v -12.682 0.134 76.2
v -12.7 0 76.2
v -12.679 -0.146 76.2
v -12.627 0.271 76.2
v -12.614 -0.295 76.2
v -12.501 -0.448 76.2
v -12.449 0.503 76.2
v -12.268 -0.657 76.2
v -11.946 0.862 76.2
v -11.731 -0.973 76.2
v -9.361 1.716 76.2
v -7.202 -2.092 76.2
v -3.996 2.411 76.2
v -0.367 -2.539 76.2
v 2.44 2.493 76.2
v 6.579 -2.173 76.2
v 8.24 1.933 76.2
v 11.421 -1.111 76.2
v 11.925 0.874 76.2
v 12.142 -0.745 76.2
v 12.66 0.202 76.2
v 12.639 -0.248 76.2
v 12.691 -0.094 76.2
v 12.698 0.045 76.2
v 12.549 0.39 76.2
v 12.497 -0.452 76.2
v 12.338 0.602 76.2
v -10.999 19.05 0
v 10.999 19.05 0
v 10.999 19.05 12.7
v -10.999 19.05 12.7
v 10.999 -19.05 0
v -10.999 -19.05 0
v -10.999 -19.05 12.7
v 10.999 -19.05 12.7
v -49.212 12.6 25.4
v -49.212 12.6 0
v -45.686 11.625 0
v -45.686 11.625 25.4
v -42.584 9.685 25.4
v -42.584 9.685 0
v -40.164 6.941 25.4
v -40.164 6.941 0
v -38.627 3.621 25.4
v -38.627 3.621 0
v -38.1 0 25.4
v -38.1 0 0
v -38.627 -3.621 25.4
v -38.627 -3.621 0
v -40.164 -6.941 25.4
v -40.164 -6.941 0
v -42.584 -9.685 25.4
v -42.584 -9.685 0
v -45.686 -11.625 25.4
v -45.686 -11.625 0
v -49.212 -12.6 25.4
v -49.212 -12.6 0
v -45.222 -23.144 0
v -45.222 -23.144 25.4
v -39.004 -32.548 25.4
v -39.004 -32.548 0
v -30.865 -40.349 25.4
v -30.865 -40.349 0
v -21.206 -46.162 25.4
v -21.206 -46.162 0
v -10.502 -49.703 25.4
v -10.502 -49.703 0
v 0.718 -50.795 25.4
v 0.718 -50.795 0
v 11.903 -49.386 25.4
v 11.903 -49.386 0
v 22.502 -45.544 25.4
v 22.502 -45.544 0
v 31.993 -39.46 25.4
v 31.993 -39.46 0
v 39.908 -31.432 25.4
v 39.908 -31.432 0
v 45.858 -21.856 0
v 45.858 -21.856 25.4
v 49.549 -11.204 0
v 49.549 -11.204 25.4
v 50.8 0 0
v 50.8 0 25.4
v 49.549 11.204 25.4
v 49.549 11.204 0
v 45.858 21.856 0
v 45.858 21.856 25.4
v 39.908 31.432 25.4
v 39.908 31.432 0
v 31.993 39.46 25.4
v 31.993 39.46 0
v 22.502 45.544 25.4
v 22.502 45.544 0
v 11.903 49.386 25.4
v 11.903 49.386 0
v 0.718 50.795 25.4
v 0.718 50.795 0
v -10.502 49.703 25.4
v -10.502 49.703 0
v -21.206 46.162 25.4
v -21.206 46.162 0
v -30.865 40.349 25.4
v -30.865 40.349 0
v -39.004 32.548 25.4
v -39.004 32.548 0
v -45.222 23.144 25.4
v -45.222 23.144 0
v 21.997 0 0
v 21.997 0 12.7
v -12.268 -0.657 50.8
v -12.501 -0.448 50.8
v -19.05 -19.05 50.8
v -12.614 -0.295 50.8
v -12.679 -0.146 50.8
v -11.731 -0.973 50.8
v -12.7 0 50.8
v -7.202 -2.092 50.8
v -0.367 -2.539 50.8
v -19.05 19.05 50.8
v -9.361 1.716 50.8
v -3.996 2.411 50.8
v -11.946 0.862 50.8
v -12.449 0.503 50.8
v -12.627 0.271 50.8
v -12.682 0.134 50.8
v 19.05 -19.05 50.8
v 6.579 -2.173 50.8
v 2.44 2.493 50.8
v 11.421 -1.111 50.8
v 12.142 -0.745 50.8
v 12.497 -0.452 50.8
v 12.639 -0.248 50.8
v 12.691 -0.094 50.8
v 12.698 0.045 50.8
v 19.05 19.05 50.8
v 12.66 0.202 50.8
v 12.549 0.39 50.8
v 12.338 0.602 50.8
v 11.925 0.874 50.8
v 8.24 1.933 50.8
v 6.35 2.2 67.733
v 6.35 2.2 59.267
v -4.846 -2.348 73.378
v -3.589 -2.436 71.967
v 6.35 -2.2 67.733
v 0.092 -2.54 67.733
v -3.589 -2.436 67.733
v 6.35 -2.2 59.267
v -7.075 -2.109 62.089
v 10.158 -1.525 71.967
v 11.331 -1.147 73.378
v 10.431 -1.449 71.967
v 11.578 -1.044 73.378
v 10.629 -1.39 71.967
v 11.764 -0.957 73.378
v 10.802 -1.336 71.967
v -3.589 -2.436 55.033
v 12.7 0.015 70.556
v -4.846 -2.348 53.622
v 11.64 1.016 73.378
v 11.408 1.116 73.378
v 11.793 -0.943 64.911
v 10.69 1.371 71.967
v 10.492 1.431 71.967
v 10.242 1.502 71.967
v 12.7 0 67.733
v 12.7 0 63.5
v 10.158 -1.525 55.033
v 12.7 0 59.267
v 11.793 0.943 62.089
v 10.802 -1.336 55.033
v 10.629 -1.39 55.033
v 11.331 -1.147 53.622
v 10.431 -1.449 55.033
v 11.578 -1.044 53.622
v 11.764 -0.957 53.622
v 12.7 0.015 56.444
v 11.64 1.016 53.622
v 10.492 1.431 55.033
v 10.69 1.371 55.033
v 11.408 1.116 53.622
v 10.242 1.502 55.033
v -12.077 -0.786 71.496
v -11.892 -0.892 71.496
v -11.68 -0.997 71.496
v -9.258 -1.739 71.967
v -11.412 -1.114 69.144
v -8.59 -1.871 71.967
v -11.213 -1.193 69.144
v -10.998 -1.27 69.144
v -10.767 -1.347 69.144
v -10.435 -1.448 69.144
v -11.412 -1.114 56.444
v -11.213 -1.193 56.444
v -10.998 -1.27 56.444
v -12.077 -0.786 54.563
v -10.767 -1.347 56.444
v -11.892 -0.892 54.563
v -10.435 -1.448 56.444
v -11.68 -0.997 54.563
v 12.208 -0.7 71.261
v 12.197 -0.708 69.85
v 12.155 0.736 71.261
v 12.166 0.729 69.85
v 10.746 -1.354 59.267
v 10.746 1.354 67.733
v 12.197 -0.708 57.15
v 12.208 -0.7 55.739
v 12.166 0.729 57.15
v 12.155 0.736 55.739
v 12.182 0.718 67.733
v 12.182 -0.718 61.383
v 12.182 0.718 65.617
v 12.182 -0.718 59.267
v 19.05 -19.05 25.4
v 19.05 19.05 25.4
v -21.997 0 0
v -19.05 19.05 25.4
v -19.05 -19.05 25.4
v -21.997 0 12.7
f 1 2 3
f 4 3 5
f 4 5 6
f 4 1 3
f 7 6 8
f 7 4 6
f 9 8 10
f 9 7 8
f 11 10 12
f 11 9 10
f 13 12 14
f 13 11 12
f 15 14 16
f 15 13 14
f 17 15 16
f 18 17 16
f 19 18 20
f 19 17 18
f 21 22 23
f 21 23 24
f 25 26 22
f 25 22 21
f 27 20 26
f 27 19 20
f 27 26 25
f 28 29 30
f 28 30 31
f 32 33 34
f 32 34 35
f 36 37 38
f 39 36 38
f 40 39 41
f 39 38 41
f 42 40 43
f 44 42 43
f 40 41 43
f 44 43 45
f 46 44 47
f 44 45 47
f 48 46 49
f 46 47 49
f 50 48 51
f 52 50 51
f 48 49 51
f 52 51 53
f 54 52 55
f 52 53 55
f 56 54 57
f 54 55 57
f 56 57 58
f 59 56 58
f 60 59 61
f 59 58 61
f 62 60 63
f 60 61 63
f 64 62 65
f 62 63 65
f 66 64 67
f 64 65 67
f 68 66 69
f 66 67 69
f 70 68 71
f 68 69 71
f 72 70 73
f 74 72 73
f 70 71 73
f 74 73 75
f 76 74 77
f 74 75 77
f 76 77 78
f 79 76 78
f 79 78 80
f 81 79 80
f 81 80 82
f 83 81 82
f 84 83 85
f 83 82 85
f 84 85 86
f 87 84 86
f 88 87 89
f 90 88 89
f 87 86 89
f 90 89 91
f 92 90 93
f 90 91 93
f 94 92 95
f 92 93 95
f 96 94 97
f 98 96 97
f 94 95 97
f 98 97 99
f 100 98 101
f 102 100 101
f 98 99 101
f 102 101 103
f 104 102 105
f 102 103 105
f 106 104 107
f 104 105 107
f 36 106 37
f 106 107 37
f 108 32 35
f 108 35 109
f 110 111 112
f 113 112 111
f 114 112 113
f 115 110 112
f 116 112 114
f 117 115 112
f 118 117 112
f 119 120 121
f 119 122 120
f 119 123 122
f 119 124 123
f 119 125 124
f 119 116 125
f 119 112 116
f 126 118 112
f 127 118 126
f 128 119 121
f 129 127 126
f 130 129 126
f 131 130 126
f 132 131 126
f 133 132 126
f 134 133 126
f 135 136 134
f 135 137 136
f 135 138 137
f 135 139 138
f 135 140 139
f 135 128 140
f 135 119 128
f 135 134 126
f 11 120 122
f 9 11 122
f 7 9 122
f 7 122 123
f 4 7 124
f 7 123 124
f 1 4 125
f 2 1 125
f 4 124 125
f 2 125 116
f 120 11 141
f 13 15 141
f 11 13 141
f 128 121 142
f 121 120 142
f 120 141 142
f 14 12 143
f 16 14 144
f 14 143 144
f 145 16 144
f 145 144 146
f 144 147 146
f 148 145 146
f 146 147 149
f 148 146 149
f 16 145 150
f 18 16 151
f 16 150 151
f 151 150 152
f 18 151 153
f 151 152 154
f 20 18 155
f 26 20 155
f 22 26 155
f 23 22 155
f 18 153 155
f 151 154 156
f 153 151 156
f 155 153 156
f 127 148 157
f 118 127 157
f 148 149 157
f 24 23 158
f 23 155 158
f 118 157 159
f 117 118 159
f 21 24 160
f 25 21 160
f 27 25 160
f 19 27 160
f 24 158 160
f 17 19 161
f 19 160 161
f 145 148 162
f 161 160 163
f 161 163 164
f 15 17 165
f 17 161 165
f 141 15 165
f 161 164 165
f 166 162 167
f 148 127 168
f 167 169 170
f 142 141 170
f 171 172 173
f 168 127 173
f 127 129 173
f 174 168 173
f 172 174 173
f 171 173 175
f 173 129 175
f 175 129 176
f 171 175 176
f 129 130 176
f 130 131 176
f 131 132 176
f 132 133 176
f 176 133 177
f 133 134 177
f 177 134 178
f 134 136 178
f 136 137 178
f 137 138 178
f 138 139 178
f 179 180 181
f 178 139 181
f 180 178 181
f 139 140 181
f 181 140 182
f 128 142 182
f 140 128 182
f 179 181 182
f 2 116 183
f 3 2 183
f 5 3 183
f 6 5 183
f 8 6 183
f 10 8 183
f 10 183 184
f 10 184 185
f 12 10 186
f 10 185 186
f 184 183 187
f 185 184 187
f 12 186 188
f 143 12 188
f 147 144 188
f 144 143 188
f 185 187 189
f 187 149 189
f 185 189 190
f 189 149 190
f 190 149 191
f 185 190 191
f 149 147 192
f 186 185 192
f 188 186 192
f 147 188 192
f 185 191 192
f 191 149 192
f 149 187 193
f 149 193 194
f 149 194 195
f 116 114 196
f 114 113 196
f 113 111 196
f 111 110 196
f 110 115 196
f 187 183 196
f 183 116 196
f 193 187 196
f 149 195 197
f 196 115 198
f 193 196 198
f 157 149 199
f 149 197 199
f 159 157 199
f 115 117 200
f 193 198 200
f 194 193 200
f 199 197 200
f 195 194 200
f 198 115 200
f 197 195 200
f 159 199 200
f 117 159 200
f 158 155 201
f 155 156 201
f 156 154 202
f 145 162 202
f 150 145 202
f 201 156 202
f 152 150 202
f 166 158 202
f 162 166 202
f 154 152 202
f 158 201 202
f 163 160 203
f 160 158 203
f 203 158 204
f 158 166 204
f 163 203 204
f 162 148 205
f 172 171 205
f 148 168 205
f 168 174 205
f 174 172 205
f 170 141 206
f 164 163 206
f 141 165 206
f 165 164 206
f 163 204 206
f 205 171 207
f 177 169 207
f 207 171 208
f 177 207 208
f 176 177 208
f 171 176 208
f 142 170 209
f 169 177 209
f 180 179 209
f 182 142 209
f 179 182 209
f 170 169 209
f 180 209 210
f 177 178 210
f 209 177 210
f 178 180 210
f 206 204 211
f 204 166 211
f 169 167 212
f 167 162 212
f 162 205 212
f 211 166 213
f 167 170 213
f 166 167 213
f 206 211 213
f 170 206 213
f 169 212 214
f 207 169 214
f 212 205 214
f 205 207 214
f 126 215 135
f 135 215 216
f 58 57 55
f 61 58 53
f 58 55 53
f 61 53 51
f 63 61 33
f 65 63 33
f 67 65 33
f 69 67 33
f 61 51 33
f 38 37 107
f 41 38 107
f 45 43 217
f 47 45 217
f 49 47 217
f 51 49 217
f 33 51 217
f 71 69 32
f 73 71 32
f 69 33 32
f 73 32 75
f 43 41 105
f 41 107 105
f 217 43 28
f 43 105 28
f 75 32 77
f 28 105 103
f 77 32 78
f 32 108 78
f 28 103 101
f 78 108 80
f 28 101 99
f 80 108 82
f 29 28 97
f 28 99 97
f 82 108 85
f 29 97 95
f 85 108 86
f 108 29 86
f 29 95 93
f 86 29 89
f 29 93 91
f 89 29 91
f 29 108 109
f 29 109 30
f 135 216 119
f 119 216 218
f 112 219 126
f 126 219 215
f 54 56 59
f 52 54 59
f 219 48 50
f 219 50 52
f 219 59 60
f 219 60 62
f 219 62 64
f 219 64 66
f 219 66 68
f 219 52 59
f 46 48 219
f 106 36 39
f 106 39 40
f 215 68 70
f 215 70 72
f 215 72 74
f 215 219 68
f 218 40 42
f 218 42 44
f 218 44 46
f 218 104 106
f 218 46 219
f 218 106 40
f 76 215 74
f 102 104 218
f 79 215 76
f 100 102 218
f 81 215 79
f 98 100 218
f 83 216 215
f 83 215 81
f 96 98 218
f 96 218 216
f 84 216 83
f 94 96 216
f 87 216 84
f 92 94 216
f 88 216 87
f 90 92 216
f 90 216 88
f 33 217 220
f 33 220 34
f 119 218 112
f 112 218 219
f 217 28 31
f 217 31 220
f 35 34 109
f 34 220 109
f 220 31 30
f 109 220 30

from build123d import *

# Parameters (mm, degrees)
F1_DEPTH = 25.4
F3_DEPTH = 25.4
F5_DEPTH = 25.4
F7_DEPTH = 12.7


with BuildPart() as f1:
    # F0 (on Top) → F1 (new body)
    with BuildSketch(Plane.XY):
        with BuildLine():
            ThreePointArc((-49.2125, 12.600391), (-38.1, 0), (-49.2125, -12.600391))
            ThreePointArc((-49.2125, -12.600391), (50.8, 0), (-49.2125, 12.600391))
        make_face()
    extrude(amount=F1_DEPTH)

    # F2 (on face) → F3 (join)
    with BuildSketch(Plane.XY.offset(25.4)):
        Polygon((0, 0), (-19.05, 19.05), (-19.05, -19.05), align=None)
        Polygon((19.05, 19.05), (-19.05, 19.05), (0, 0), align=None)
        Polygon((19.05, -19.05), (19.05, 19.05), (0, 0), align=None)
        Polygon((0, 0), (-19.05, -19.05), (19.05, -19.05), align=None)
    extrude(amount=F3_DEPTH)

    # F4 (on face) → F5 (join)
    with BuildSketch(Plane.XY.offset(50.8)):
        with BuildLine():
            add(Edge.make_bspline(
                [(-12.7, 0), (-12.7, -4.399409), (6.35, -2.199705), (25.4, 0), (6.35, 2.199705), (-12.7, 4.399409), (-12.7, 0)],
                knots=[0, 0, 0, 2.094395, 2.094395, 4.18879, 4.18879, 6.283185, 6.283185, 6.283185], degree=2, weights=[1, 0.5, 1, 0.5, 1, 0.5, 1]))
        make_face()
    extrude(amount=F5_DEPTH)

    # F6 (on Top) → F7 (cut)
    with BuildSketch(Plane.XY):
        with BuildLine():
            ThreePointArc((16.497784, -9.525), (18.400887, -4.930503), (19.05, 0))
            ThreePointArc((19.05, 0), (18.400887, 4.930503), (16.497784, 9.525))
            ThreePointArc((16.497784, 9.525), (9.525, 16.497784), (0, 19.05))
            ThreePointArc((0, 19.05), (-9.525, 16.497784), (-16.497784, 9.525))
            ThreePointArc((-16.497784, 9.525), (-19.05, 0), (-16.497784, -9.525))
            ThreePointArc((-16.497784, -9.525), (-9.525, -16.497784), (0, -19.05))
            ThreePointArc((0, -19.05), (9.525, -16.497784), (16.497784, -9.525))
        make_face()
        with BuildLine():
            ThreePointArc((16.497784, 9.525), (18.400887, 4.930503), (19.05, 0))
            ThreePointArc((19.05, 0), (18.400887, -4.930503), (16.497784, -9.525))
            Line((16.497784, -9.525), (21.997045, 0))
            Line((21.997045, 0), (16.497784, 9.525))
        make_face()
        with BuildLine():
            ThreePointArc((0, 19.05), (9.525, 16.497784), (16.497784, 9.525))
            Line((16.497784, 9.525), (10.998523, 19.05))
            Line((10.998523, 19.05), (0, 19.05))
        make_face()
        with BuildLine():
            Line((10.998523, -19.05), (16.497784, -9.525))
            ThreePointArc((16.497784, -9.525), (9.525, -16.497784), (0, -19.05))
            Line((0, -19.05), (10.998523, -19.05))
        make_face()
        with BuildLine():
            ThreePointArc((-16.497784, 9.525), (-9.525, 16.497784), (0, 19.05))
            Line((0, 19.05), (-10.998523, 19.05))
            Line((-10.998523, 19.05), (-16.497784, 9.525))
        make_face()
        with BuildLine():
            Line((-10.998523, -19.05), (0, -19.05))
            ThreePointArc((0, -19.05), (-9.525, -16.497784), (-16.497784, -9.525))
            Line((-16.497784, -9.525), (-10.998523, -19.05))
        make_face()
        with BuildLine():
            ThreePointArc((-16.497784, -9.525), (-19.05, 0), (-16.497784, 9.525))
            Line((-16.497784, 9.525), (-21.997045, 0))
            Line((-21.997045, 0), (-16.497784, -9.525))
        make_face()
    extrude(amount=F7_DEPTH, mode=Mode.SUBTRACT)


solid = f1.part
